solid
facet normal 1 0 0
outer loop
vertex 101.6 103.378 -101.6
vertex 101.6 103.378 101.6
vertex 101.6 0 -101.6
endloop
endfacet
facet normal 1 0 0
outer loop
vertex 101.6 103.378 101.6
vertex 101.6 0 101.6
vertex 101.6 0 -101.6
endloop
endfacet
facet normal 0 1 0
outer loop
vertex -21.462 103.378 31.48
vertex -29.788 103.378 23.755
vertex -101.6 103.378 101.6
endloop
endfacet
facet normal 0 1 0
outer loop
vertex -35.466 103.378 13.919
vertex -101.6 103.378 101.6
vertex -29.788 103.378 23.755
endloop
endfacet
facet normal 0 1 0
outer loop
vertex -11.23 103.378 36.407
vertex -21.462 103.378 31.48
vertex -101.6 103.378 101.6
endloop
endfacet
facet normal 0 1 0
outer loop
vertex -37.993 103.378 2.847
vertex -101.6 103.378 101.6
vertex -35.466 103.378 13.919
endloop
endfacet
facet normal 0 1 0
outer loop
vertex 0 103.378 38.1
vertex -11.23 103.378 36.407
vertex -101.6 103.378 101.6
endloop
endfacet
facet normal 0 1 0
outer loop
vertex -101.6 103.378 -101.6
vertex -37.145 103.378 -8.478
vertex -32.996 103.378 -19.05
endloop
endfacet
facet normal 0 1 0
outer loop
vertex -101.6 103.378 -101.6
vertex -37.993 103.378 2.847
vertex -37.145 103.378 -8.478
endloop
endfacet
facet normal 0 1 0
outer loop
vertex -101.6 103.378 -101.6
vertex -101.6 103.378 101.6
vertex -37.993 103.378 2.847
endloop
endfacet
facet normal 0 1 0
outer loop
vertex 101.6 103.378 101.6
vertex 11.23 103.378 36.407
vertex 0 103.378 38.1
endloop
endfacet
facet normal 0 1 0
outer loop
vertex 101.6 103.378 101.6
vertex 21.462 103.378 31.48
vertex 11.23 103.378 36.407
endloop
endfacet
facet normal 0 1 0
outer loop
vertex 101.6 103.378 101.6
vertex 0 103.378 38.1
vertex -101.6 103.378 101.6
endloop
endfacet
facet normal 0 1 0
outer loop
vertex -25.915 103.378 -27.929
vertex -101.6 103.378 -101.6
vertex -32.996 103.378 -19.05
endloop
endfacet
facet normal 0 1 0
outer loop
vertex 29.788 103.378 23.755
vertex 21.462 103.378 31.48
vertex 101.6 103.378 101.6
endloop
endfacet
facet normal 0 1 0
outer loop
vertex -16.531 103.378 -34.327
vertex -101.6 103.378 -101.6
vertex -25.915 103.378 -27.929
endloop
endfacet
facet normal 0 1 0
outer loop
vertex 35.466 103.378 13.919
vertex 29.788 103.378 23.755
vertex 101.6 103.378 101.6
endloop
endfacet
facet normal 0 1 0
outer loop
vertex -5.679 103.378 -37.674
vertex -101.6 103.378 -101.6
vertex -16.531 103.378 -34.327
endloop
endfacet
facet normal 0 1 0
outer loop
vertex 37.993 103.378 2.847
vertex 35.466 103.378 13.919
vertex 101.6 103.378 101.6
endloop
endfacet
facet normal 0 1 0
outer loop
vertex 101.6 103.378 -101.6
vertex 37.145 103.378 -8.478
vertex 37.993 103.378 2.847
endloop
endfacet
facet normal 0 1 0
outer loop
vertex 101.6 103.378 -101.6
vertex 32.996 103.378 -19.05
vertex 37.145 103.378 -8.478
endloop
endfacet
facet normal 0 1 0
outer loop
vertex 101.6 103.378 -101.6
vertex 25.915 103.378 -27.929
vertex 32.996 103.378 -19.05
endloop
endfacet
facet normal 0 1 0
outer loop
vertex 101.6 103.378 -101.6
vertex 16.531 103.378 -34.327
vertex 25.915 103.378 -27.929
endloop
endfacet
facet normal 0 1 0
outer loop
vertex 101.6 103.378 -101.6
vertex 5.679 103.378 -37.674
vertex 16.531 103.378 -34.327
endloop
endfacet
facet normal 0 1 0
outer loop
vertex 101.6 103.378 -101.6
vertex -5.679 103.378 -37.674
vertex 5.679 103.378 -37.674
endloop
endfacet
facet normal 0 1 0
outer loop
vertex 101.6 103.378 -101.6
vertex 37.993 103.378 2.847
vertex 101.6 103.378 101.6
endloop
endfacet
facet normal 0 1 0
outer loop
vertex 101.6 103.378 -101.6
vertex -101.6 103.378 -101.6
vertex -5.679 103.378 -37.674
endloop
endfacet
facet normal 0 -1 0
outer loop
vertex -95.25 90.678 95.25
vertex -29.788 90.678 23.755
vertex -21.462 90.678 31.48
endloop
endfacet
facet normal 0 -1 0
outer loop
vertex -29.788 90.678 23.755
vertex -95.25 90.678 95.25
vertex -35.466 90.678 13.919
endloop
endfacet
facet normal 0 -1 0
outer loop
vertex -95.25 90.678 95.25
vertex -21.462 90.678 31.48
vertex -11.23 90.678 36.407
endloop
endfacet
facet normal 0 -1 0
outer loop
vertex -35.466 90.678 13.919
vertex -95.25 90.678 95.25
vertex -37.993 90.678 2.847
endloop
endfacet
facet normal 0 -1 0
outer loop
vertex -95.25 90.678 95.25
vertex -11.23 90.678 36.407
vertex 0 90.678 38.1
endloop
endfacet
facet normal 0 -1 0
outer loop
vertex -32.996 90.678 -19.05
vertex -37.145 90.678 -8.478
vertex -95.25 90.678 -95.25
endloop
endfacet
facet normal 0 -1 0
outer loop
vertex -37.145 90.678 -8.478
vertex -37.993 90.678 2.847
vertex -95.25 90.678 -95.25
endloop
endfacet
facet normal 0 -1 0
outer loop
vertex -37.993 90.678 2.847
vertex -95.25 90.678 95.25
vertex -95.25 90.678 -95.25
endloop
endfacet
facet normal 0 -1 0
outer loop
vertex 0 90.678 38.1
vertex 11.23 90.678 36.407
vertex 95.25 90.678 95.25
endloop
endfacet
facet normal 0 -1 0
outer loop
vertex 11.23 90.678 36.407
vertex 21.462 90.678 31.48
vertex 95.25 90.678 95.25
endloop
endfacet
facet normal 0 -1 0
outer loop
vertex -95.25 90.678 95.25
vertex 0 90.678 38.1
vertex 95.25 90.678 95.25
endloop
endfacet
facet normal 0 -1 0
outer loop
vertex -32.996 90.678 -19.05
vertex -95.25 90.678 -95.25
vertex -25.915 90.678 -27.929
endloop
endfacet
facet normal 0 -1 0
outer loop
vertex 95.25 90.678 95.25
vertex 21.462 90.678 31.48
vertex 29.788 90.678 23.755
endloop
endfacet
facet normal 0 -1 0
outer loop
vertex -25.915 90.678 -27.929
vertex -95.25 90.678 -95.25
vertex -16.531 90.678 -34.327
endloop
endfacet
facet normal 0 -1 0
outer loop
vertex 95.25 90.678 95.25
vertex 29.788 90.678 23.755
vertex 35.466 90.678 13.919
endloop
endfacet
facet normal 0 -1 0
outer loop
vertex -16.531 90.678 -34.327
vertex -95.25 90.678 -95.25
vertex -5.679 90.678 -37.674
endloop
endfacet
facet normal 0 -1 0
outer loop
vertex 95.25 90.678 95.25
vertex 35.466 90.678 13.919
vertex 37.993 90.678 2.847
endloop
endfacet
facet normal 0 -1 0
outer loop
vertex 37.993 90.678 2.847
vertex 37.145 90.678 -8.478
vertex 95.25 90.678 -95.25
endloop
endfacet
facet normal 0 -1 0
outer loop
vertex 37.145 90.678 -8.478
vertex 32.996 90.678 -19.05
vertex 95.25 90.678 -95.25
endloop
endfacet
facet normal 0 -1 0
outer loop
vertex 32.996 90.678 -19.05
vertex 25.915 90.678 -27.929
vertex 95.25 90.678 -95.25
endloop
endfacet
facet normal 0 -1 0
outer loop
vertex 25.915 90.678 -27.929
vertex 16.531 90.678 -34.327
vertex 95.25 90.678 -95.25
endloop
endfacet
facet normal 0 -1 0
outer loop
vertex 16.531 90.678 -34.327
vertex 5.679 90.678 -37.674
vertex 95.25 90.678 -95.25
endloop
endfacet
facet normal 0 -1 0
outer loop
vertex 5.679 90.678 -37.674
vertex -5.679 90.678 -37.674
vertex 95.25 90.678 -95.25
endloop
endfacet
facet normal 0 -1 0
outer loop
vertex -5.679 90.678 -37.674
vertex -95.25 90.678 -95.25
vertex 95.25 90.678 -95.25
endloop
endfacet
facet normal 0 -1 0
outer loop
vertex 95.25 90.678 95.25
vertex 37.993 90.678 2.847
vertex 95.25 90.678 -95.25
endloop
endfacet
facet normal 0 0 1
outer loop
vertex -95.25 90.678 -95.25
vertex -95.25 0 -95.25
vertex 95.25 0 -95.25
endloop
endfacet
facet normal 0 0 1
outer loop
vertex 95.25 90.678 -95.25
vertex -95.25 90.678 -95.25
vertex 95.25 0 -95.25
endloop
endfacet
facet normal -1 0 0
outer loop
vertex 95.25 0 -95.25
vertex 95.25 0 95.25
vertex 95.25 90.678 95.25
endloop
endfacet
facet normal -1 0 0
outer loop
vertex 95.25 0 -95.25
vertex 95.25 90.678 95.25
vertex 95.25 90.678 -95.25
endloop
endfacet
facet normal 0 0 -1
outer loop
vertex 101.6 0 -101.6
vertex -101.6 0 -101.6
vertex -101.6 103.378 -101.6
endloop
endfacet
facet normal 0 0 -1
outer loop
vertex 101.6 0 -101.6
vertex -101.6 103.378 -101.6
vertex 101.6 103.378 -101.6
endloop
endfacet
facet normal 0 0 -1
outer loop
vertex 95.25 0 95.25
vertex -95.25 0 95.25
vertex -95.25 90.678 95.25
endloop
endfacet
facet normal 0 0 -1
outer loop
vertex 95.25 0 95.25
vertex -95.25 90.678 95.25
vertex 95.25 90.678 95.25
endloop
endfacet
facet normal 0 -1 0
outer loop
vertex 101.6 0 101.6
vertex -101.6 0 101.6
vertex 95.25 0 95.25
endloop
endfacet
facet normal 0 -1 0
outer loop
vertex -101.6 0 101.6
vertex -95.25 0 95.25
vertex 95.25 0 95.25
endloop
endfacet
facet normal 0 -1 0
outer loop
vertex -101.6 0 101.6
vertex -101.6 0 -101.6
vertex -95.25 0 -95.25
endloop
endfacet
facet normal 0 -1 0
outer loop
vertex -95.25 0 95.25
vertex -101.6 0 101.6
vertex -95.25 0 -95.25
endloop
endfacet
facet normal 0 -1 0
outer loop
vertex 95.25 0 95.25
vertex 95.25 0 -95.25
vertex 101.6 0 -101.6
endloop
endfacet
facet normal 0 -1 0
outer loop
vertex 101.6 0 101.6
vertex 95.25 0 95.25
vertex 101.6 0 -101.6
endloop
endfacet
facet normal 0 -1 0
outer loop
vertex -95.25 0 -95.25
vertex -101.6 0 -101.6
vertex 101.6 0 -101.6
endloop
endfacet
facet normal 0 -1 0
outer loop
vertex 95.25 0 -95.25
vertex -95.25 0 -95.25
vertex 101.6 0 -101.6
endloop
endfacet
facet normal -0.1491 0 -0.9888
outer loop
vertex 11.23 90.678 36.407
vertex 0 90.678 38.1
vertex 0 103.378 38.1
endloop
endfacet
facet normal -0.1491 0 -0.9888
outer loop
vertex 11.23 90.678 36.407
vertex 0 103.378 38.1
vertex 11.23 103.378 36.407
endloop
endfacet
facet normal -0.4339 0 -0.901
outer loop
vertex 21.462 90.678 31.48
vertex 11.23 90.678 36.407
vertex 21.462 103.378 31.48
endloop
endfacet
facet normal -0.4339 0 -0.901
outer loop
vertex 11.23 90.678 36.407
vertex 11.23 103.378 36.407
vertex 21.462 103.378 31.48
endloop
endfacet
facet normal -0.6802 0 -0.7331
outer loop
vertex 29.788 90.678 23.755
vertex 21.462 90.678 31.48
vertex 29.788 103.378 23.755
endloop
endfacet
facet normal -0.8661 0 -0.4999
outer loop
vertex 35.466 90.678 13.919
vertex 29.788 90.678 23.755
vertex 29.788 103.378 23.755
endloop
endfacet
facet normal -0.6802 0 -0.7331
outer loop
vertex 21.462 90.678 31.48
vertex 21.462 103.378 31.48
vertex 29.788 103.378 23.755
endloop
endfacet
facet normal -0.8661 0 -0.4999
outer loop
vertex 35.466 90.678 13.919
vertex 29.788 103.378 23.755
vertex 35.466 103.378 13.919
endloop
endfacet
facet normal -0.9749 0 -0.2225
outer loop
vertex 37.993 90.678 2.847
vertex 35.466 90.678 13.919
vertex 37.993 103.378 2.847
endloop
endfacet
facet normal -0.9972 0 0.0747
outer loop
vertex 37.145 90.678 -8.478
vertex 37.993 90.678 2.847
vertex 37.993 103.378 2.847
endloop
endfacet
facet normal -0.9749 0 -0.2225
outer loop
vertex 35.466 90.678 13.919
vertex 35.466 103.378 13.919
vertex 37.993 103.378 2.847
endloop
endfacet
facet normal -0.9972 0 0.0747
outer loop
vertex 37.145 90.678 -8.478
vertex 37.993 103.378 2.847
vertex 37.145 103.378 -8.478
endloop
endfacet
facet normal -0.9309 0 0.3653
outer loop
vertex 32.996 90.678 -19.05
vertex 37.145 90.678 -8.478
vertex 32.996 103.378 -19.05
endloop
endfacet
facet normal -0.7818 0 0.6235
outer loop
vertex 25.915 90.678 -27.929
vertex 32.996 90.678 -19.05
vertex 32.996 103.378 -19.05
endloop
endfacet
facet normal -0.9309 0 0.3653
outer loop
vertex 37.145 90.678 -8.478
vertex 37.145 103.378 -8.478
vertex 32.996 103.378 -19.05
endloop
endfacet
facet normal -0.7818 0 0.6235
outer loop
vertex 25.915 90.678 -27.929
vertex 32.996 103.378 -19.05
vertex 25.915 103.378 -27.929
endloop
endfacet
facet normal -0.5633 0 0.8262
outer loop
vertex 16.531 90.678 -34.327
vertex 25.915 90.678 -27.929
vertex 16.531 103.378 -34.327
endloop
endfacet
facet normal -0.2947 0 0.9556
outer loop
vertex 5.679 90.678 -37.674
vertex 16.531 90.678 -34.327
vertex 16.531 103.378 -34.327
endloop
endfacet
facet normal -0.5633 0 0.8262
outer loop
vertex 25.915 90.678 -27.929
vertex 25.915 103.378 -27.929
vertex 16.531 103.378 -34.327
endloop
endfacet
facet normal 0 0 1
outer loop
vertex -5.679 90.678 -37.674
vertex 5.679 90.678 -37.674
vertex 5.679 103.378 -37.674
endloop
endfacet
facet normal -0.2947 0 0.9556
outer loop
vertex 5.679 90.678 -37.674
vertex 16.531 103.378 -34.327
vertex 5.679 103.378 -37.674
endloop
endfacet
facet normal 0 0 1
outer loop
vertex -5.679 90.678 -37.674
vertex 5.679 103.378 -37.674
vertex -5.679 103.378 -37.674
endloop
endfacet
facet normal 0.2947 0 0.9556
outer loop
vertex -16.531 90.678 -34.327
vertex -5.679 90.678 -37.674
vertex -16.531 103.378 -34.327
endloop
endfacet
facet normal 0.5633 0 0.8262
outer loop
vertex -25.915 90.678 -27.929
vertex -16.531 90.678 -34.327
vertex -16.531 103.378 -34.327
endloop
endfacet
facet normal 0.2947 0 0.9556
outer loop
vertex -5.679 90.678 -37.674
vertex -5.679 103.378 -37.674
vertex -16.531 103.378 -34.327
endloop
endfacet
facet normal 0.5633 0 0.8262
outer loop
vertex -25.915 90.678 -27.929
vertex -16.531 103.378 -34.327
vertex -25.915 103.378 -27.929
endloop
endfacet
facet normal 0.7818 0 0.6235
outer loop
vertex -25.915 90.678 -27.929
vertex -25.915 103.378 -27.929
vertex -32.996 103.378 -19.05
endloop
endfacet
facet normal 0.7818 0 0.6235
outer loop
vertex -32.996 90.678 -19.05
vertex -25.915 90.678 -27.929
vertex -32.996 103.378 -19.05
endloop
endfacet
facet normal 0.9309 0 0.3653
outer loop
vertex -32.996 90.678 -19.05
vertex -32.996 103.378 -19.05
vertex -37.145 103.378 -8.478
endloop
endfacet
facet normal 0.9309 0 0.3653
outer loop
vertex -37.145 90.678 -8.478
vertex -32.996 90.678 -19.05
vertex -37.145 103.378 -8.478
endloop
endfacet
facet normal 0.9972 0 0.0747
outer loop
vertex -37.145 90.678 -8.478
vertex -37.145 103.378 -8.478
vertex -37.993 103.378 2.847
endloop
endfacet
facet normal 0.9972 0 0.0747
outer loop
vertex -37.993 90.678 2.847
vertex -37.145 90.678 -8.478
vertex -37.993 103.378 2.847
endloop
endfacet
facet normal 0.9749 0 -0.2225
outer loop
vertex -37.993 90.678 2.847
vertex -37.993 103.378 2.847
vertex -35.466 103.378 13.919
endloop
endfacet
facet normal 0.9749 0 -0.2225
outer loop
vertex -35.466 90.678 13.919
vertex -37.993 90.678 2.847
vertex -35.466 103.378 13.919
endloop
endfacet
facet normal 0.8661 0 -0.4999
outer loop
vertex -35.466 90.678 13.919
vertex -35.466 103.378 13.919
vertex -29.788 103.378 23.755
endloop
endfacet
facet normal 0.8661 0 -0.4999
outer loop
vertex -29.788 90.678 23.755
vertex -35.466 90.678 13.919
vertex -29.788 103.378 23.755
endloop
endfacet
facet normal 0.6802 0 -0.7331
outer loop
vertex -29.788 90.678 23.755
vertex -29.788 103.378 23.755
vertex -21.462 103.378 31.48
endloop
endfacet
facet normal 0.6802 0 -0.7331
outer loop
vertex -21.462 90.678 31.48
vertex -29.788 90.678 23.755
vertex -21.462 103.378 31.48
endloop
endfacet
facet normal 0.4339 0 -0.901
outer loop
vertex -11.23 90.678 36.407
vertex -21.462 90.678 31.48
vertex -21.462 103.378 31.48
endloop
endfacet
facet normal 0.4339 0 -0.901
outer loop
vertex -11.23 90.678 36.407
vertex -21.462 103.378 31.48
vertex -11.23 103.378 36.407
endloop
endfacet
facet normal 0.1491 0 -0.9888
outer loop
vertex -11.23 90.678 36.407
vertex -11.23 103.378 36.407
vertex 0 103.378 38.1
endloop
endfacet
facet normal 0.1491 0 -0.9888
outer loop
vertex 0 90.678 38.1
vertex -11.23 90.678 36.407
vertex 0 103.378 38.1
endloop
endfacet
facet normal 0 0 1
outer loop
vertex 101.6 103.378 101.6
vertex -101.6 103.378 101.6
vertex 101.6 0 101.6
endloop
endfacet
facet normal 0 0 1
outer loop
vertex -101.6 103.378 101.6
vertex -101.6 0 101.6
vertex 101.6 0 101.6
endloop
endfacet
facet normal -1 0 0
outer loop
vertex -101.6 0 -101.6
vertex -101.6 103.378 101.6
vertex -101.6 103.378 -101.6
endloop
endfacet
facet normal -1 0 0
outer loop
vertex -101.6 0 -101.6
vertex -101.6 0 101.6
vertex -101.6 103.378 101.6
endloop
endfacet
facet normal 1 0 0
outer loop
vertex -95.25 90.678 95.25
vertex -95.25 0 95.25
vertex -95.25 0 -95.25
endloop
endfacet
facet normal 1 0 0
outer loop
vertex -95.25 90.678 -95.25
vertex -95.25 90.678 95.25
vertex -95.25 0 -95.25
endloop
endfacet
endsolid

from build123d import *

# Parameters (mm, degrees)
SKETCH1_W           = 203.2
SKETCH1_H           = 203.2
SKETCH1_W_2         = 190.5
SKETCH1_H_2         = 190.5
BOSS_EXTRUDE1_DEPTH = 90.678
SKETCH2_W           = 203.2
SKETCH2_H           = 203.2
BOSS_EXTRUDE2_DEPTH = 12.7
SKETCH4_R           = 38.1
CUT_EXTRUDE3_DEPTH  = 178.008844084


with BuildPart() as part:
    # Sketch1 → Boss-Extrude1 (new body)
    with BuildSketch(Plane(origin=(0, 0, 0), x_dir=(1, 0, 0), z_dir=(0, 1, 0))):
        Rectangle(SKETCH1_W, SKETCH1_H)
        Rectangle(SKETCH1_W_2, SKETCH1_H_2, mode=Mode.SUBTRACT)
    extrude(amount=BOSS_EXTRUDE1_DEPTH)

    # Sketch2 → Boss-Extrude2 (add)
    with BuildSketch(Plane(origin=(0, 90.678, 0), x_dir=(1, 0, 0), z_dir=(0, 1, 0))):
        Rectangle(SKETCH2_W, SKETCH2_H)
    extrude(amount=BOSS_EXTRUDE2_DEPTH)

    # Sketch4 → Cut-Extrude3 (cut, through all)
    with BuildSketch(Plane(origin=(0, 103.378, 0), x_dir=(1, 0, 0), z_dir=(0, 1, 0))):
        with Locations(Location((0, 0, 0), (0, 0, 270))):
            Circle(SKETCH4_R)
    extrude(amount=-CUT_EXTRUDE3_DEPTH, mode=Mode.SUBTRACT)


solid = part.part
